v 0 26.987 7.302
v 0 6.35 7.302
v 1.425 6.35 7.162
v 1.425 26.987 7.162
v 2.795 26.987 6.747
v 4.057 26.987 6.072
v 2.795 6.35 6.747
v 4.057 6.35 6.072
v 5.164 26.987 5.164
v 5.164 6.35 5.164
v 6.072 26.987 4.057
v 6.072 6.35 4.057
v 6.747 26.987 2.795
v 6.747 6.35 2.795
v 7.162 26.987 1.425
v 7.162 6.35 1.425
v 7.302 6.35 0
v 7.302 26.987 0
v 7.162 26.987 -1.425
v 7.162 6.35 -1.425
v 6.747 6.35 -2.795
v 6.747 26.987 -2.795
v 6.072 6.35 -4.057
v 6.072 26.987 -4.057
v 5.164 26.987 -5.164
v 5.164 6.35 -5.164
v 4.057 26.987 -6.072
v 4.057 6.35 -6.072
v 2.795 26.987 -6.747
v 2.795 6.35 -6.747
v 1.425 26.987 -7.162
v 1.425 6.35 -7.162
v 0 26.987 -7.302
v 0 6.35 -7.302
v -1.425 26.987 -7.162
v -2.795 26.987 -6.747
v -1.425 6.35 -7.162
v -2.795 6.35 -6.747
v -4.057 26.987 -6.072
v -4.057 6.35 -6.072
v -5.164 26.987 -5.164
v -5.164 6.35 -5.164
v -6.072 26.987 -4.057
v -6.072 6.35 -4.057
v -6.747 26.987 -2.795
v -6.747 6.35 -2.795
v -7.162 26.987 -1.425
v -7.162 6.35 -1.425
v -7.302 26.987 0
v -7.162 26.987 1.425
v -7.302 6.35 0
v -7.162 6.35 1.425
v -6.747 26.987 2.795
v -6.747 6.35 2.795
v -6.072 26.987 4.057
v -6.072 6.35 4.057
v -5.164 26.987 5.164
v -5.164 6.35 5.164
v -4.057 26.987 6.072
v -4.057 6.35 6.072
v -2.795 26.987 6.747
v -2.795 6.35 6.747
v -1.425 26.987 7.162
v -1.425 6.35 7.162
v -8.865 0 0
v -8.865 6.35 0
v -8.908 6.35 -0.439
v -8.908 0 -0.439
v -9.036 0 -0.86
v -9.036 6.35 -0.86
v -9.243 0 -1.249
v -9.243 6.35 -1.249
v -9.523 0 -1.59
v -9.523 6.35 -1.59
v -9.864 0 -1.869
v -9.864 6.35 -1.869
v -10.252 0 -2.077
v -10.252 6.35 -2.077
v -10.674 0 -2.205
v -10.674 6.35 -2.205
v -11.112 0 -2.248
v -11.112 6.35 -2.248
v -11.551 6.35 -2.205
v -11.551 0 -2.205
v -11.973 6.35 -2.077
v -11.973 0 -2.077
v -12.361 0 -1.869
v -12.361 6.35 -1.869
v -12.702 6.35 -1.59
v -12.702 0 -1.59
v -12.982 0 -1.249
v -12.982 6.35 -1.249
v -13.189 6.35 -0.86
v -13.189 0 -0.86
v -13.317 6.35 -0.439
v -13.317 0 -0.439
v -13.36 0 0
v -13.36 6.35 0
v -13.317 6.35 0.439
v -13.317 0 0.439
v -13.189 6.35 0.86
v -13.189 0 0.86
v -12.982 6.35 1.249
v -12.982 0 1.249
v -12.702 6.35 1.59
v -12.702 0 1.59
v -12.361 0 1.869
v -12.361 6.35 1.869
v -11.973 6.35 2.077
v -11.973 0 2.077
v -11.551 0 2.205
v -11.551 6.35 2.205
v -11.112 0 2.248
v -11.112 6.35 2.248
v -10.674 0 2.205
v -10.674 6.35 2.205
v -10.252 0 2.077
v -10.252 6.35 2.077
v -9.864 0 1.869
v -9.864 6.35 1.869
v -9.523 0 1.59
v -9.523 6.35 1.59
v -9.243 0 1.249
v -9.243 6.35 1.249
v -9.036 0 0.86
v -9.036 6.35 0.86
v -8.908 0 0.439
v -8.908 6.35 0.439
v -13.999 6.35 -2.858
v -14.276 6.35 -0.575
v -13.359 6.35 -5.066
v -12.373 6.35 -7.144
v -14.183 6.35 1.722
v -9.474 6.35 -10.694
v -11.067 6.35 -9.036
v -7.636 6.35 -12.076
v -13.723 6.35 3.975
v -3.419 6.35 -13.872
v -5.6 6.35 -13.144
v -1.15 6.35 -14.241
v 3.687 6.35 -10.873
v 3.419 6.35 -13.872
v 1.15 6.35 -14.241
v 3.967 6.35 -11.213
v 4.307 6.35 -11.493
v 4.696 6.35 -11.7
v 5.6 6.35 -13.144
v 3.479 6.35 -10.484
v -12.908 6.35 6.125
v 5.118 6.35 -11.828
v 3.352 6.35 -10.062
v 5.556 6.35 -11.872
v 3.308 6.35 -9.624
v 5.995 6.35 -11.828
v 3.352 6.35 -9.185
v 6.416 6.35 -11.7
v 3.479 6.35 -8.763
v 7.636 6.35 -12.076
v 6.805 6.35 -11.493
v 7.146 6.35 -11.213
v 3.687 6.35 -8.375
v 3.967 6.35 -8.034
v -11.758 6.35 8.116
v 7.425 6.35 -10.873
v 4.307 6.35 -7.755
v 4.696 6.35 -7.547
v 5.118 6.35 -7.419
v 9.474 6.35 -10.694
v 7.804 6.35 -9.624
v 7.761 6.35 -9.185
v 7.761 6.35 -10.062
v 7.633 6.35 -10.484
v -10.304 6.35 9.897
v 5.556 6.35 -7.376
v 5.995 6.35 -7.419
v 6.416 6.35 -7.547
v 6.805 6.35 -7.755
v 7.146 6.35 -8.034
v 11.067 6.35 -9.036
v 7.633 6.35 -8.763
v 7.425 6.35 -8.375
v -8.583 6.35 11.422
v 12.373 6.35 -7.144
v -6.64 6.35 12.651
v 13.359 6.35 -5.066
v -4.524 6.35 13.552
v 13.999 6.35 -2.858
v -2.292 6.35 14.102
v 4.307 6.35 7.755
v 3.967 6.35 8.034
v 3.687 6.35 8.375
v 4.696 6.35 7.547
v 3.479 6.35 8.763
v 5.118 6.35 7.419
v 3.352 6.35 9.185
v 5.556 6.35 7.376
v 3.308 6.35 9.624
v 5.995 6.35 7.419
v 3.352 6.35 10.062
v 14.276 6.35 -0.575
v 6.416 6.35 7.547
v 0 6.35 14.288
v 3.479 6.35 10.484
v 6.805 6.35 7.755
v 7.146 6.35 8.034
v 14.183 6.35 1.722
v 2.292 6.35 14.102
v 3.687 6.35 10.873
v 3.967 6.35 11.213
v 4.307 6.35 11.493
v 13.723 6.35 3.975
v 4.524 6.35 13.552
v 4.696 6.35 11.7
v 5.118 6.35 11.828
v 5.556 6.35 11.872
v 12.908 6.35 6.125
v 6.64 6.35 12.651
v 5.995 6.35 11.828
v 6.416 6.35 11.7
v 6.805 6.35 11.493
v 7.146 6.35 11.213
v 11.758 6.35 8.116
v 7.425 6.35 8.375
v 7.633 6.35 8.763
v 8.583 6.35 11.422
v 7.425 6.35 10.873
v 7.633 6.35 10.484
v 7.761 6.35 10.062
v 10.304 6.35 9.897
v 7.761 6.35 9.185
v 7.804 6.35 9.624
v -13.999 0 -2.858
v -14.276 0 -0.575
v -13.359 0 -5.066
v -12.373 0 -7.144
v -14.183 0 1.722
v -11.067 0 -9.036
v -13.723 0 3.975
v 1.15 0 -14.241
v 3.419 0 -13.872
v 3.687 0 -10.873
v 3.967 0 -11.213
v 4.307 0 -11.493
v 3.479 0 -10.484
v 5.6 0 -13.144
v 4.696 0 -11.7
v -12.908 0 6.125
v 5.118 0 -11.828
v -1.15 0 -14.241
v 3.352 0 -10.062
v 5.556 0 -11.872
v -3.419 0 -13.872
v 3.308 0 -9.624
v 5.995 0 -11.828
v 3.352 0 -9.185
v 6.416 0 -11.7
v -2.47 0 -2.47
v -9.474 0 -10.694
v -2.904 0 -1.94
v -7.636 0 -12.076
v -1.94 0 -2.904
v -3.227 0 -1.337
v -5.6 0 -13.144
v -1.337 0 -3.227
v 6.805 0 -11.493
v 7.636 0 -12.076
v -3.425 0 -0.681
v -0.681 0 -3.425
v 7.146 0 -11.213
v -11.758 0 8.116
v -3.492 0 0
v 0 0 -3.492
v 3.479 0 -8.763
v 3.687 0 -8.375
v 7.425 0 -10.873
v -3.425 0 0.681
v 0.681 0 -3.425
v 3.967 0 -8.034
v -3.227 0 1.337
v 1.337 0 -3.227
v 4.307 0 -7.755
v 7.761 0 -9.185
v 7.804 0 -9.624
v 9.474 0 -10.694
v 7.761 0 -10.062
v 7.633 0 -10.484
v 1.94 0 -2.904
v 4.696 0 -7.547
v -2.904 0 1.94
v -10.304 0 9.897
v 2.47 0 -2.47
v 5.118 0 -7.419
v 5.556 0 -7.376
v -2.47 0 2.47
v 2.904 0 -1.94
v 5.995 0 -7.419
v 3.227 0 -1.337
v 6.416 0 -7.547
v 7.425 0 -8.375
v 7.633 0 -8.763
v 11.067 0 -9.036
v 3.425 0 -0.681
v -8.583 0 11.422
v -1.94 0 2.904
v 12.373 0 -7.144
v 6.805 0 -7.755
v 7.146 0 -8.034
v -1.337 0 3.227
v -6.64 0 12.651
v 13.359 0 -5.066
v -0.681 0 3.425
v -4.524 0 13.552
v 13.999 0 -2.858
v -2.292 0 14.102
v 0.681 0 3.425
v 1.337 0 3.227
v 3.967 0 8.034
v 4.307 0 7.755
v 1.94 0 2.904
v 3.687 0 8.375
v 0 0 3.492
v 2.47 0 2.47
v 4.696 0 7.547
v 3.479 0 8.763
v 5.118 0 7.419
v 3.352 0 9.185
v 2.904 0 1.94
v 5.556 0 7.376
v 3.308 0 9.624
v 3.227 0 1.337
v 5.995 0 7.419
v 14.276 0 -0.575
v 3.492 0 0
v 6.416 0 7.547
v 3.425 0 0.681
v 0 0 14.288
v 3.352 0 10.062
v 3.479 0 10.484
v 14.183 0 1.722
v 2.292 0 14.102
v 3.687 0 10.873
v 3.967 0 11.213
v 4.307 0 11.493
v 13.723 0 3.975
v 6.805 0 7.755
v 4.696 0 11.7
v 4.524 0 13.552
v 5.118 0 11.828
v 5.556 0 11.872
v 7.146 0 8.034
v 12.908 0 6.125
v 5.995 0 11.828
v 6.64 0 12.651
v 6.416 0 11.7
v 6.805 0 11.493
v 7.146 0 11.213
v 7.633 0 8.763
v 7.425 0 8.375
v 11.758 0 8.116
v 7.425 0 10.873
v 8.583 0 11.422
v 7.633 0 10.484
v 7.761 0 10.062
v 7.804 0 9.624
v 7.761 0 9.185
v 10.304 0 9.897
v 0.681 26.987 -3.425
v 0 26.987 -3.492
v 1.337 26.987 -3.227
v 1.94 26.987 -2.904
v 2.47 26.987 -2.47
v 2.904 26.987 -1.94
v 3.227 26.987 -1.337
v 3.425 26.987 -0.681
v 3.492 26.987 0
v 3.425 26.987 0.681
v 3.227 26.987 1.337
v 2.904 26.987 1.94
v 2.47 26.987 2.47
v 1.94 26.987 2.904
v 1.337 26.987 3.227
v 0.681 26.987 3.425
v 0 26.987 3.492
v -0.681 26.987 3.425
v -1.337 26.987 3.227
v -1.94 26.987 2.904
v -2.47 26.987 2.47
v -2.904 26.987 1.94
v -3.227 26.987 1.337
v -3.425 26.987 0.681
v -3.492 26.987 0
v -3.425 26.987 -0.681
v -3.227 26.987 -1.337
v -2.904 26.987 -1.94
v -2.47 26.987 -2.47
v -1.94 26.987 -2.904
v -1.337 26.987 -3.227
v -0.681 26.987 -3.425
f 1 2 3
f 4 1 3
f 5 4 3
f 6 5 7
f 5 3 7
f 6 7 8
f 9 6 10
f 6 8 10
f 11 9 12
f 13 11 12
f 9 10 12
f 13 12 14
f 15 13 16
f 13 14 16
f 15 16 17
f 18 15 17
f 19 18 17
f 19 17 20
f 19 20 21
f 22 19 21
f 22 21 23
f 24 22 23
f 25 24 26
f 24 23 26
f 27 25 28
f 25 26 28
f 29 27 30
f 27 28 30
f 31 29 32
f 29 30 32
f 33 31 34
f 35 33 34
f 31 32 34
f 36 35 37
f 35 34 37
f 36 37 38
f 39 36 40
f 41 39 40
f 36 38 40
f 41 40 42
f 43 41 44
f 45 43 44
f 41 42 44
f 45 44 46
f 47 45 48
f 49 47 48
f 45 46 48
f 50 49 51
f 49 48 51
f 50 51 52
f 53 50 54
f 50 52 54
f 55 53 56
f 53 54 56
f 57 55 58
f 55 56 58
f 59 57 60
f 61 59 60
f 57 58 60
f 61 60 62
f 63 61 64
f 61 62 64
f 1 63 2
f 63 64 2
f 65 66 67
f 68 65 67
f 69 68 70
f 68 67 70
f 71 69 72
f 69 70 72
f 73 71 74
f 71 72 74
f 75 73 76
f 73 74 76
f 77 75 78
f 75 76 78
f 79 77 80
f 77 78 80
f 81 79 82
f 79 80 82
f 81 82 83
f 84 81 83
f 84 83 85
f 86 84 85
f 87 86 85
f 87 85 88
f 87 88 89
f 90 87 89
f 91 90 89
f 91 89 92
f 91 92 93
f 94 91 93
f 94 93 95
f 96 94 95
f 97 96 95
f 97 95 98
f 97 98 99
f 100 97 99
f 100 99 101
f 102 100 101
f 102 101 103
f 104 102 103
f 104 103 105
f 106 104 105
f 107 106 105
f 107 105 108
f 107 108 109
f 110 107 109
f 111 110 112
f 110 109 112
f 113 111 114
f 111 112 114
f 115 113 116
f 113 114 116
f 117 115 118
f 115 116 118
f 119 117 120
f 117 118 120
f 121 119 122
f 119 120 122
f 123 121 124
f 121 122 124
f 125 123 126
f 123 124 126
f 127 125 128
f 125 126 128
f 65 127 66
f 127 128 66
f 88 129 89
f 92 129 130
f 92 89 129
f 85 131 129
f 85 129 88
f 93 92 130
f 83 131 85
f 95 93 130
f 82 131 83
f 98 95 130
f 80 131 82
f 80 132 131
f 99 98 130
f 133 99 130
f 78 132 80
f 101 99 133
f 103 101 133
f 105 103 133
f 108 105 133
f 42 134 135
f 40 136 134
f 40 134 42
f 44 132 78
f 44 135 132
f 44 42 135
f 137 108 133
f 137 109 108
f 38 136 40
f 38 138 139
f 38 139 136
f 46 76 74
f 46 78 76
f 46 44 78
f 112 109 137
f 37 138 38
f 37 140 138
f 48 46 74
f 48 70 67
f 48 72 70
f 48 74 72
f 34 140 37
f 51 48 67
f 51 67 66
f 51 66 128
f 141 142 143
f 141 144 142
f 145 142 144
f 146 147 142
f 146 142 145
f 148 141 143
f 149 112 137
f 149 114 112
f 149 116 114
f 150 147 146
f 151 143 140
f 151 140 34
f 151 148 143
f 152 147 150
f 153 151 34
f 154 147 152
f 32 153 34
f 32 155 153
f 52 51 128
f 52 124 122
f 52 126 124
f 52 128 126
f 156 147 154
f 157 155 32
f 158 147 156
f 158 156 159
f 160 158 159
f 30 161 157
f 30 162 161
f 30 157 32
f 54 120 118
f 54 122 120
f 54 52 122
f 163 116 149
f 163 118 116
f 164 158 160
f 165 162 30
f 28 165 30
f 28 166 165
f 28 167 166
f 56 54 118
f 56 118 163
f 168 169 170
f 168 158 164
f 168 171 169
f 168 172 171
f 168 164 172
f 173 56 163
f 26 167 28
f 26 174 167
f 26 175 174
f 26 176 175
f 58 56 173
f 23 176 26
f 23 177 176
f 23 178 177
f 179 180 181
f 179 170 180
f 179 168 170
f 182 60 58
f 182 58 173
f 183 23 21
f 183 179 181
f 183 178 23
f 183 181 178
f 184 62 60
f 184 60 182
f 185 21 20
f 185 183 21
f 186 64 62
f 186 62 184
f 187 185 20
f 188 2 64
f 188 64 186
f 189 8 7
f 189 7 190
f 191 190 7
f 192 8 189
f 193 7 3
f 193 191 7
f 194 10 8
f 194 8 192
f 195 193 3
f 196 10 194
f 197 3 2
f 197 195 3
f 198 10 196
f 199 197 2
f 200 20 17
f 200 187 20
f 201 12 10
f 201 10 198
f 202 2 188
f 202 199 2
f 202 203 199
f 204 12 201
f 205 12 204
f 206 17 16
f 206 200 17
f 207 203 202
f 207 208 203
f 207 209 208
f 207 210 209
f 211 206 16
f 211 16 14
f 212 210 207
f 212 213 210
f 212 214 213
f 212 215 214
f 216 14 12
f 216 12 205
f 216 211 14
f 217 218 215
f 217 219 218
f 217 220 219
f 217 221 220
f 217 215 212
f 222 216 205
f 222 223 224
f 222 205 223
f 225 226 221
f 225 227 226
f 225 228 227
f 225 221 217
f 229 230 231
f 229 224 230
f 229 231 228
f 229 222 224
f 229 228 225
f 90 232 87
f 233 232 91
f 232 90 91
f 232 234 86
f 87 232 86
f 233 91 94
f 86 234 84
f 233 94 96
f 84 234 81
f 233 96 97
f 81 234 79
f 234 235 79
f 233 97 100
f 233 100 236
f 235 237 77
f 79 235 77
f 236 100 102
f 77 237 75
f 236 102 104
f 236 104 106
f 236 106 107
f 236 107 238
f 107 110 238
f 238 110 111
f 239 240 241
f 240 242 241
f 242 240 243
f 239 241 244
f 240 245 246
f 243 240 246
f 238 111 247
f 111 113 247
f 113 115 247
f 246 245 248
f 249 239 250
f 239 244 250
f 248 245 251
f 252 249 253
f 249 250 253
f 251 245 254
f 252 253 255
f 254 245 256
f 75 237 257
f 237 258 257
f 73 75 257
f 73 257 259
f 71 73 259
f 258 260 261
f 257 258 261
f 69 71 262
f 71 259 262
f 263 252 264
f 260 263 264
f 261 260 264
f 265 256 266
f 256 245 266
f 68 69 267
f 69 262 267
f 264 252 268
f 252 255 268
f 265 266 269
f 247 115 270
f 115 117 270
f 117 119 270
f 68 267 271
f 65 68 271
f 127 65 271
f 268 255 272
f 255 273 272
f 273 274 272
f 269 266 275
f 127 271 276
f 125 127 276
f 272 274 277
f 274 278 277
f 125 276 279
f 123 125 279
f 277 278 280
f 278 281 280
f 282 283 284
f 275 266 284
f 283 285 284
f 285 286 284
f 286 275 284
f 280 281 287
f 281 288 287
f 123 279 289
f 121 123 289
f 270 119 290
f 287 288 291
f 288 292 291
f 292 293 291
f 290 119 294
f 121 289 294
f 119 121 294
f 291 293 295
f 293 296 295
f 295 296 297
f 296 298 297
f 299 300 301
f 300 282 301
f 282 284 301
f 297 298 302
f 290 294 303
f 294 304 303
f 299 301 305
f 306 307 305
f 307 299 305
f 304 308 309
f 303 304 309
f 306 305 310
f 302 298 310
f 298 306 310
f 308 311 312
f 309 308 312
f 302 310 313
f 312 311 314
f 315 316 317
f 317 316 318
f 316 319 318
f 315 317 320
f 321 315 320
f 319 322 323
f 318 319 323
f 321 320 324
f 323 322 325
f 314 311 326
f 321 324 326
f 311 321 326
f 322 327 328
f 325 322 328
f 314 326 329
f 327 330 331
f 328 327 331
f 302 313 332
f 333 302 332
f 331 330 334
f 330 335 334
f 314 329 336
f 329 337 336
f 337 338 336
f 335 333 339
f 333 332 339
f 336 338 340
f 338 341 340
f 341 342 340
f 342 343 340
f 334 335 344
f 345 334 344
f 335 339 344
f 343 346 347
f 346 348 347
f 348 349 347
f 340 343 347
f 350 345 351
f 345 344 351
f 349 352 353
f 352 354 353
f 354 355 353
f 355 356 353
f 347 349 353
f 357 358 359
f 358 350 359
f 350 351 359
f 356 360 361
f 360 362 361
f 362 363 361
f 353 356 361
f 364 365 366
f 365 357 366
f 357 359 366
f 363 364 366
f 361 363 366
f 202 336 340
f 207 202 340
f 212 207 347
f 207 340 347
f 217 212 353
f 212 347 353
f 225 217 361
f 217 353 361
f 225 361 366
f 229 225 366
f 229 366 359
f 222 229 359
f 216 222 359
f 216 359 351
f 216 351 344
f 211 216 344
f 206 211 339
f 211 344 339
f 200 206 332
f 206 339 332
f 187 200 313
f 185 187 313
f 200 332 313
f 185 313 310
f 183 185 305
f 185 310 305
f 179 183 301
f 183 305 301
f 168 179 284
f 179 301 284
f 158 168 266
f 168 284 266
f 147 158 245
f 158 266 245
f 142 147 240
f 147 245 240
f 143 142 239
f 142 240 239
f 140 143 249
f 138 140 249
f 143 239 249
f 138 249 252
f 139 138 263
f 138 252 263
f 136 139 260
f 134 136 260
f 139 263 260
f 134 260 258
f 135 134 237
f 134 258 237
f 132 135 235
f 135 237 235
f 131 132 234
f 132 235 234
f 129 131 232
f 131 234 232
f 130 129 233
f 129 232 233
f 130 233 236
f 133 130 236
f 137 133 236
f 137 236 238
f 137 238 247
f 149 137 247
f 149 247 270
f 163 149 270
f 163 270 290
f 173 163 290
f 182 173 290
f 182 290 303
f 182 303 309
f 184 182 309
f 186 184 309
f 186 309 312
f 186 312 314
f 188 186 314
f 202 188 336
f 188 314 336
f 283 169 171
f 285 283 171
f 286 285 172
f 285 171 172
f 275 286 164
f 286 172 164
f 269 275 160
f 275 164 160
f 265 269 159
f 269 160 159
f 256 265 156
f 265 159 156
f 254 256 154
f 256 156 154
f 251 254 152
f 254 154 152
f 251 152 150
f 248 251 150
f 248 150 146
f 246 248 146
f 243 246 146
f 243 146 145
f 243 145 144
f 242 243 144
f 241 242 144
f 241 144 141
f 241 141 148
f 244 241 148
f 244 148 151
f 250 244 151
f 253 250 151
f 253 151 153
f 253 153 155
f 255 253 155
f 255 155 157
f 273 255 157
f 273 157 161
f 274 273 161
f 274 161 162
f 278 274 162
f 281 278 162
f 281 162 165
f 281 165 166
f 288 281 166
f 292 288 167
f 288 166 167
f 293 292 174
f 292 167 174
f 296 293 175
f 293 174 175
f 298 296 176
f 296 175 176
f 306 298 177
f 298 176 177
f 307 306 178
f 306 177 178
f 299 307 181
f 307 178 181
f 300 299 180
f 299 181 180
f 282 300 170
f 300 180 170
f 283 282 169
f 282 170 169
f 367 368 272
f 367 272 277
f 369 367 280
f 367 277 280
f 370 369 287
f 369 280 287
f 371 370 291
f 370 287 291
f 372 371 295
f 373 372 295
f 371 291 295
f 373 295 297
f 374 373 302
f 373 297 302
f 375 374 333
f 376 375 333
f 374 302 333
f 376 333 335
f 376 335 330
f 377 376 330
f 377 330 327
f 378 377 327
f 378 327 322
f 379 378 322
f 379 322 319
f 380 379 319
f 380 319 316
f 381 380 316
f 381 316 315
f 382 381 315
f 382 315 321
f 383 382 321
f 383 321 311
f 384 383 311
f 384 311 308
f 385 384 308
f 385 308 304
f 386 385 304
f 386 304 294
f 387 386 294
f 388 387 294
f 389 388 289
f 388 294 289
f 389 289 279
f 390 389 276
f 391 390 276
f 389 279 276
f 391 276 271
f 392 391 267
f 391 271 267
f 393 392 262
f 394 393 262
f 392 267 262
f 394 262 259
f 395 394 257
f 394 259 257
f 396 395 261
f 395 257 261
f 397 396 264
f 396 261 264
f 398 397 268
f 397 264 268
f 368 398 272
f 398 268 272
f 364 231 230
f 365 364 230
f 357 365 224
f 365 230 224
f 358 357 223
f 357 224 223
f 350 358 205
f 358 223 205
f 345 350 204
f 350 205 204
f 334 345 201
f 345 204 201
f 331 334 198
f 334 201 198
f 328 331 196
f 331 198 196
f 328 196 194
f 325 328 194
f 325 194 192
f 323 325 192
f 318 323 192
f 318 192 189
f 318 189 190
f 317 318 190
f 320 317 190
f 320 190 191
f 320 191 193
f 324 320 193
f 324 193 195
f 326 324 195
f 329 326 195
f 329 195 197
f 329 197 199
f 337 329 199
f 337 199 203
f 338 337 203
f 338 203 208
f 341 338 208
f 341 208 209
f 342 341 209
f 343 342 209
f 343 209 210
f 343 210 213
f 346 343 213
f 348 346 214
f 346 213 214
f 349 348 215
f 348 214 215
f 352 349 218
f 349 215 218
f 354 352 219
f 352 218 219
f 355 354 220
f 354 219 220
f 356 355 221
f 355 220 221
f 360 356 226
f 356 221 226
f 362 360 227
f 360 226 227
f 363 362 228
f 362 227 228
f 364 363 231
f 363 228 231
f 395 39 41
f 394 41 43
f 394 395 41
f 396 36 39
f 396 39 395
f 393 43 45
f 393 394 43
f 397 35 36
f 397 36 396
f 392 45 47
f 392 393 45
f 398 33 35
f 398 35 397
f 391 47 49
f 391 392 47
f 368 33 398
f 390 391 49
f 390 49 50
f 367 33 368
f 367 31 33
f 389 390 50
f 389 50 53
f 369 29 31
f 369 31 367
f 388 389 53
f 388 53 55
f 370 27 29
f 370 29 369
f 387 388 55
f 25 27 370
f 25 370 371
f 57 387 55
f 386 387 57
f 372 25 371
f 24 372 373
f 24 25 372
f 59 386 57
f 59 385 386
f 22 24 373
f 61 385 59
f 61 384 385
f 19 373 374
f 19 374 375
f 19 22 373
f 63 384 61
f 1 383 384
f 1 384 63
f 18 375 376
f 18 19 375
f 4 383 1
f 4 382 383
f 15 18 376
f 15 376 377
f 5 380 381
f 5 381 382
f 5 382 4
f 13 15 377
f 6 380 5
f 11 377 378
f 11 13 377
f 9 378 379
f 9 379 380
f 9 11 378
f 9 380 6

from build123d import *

# Parameters (mm, degrees)
SKETCH1_R             = 14.2875
BOSS_EXTRUDE1_DEPTH   = 6.35
SKETCH2_R             = 7.3025
BOSS_EXTRUDE2_DEPTH   = 20.6375
CUT_EXTRUDE1_REACH    = 35.713
SKETCH3_R             = 3.4925
F_8_CLEARANCE_HOLE1_D = 4.4958


with BuildPart() as part:
    # Sketch1 → Boss-Extrude1 (new body)
    with BuildSketch(Plane(origin=(0, 0, 0), x_dir=(1, 0, 0), z_dir=(0, 1, 0))):
        with Locations(Location((0, 0, 0), (0, 0, 270))):
            Circle(SKETCH1_R)
    extrude(amount=BOSS_EXTRUDE1_DEPTH)

    # Sketch2 → Boss-Extrude2 (add)
    with BuildSketch(Plane(origin=(0, 6.35, 0), x_dir=(1, 0, 0), z_dir=(0, 1, 0))):
        with Locations(Location((0, 0, 0), (0, 0, 270))):
            Circle(SKETCH2_R)
    extrude(amount=BOSS_EXTRUDE2_DEPTH)

    # Sketch3 → Cut-Extrude1 (cut, up to next)
    with BuildSketch(Plane.XZ, mode=Mode.PRIVATE) as cut_extrude1_sk1:
        with Locations(Location((0, 0, 0), (0, 0, 270))):
            Circle(SKETCH3_R)
    cut_extrude1_tool1 = extrude(cut_extrude1_sk1.sketch, amount=-CUT_EXTRUDE1_REACH, mode=Mode.PRIVATE) & part.part
    add(cut_extrude1_tool1.solids().sort_by_distance((0, 0, 0))[0], mode=Mode.SUBTRACT)

    # #8 Clearance Hole1 (through all)
    with Locations(Plane(origin=(0, 0, 0), x_dir=(-1, 0, 0), z_dir=(0, -1, 0))):
        with Locations((-5.55625, 9.6237073), (11.1125, 0), (-5.55625, -9.6237073)):
            Hole(F_8_CLEARANCE_HOLE1_D / 2)


solid = part.part
